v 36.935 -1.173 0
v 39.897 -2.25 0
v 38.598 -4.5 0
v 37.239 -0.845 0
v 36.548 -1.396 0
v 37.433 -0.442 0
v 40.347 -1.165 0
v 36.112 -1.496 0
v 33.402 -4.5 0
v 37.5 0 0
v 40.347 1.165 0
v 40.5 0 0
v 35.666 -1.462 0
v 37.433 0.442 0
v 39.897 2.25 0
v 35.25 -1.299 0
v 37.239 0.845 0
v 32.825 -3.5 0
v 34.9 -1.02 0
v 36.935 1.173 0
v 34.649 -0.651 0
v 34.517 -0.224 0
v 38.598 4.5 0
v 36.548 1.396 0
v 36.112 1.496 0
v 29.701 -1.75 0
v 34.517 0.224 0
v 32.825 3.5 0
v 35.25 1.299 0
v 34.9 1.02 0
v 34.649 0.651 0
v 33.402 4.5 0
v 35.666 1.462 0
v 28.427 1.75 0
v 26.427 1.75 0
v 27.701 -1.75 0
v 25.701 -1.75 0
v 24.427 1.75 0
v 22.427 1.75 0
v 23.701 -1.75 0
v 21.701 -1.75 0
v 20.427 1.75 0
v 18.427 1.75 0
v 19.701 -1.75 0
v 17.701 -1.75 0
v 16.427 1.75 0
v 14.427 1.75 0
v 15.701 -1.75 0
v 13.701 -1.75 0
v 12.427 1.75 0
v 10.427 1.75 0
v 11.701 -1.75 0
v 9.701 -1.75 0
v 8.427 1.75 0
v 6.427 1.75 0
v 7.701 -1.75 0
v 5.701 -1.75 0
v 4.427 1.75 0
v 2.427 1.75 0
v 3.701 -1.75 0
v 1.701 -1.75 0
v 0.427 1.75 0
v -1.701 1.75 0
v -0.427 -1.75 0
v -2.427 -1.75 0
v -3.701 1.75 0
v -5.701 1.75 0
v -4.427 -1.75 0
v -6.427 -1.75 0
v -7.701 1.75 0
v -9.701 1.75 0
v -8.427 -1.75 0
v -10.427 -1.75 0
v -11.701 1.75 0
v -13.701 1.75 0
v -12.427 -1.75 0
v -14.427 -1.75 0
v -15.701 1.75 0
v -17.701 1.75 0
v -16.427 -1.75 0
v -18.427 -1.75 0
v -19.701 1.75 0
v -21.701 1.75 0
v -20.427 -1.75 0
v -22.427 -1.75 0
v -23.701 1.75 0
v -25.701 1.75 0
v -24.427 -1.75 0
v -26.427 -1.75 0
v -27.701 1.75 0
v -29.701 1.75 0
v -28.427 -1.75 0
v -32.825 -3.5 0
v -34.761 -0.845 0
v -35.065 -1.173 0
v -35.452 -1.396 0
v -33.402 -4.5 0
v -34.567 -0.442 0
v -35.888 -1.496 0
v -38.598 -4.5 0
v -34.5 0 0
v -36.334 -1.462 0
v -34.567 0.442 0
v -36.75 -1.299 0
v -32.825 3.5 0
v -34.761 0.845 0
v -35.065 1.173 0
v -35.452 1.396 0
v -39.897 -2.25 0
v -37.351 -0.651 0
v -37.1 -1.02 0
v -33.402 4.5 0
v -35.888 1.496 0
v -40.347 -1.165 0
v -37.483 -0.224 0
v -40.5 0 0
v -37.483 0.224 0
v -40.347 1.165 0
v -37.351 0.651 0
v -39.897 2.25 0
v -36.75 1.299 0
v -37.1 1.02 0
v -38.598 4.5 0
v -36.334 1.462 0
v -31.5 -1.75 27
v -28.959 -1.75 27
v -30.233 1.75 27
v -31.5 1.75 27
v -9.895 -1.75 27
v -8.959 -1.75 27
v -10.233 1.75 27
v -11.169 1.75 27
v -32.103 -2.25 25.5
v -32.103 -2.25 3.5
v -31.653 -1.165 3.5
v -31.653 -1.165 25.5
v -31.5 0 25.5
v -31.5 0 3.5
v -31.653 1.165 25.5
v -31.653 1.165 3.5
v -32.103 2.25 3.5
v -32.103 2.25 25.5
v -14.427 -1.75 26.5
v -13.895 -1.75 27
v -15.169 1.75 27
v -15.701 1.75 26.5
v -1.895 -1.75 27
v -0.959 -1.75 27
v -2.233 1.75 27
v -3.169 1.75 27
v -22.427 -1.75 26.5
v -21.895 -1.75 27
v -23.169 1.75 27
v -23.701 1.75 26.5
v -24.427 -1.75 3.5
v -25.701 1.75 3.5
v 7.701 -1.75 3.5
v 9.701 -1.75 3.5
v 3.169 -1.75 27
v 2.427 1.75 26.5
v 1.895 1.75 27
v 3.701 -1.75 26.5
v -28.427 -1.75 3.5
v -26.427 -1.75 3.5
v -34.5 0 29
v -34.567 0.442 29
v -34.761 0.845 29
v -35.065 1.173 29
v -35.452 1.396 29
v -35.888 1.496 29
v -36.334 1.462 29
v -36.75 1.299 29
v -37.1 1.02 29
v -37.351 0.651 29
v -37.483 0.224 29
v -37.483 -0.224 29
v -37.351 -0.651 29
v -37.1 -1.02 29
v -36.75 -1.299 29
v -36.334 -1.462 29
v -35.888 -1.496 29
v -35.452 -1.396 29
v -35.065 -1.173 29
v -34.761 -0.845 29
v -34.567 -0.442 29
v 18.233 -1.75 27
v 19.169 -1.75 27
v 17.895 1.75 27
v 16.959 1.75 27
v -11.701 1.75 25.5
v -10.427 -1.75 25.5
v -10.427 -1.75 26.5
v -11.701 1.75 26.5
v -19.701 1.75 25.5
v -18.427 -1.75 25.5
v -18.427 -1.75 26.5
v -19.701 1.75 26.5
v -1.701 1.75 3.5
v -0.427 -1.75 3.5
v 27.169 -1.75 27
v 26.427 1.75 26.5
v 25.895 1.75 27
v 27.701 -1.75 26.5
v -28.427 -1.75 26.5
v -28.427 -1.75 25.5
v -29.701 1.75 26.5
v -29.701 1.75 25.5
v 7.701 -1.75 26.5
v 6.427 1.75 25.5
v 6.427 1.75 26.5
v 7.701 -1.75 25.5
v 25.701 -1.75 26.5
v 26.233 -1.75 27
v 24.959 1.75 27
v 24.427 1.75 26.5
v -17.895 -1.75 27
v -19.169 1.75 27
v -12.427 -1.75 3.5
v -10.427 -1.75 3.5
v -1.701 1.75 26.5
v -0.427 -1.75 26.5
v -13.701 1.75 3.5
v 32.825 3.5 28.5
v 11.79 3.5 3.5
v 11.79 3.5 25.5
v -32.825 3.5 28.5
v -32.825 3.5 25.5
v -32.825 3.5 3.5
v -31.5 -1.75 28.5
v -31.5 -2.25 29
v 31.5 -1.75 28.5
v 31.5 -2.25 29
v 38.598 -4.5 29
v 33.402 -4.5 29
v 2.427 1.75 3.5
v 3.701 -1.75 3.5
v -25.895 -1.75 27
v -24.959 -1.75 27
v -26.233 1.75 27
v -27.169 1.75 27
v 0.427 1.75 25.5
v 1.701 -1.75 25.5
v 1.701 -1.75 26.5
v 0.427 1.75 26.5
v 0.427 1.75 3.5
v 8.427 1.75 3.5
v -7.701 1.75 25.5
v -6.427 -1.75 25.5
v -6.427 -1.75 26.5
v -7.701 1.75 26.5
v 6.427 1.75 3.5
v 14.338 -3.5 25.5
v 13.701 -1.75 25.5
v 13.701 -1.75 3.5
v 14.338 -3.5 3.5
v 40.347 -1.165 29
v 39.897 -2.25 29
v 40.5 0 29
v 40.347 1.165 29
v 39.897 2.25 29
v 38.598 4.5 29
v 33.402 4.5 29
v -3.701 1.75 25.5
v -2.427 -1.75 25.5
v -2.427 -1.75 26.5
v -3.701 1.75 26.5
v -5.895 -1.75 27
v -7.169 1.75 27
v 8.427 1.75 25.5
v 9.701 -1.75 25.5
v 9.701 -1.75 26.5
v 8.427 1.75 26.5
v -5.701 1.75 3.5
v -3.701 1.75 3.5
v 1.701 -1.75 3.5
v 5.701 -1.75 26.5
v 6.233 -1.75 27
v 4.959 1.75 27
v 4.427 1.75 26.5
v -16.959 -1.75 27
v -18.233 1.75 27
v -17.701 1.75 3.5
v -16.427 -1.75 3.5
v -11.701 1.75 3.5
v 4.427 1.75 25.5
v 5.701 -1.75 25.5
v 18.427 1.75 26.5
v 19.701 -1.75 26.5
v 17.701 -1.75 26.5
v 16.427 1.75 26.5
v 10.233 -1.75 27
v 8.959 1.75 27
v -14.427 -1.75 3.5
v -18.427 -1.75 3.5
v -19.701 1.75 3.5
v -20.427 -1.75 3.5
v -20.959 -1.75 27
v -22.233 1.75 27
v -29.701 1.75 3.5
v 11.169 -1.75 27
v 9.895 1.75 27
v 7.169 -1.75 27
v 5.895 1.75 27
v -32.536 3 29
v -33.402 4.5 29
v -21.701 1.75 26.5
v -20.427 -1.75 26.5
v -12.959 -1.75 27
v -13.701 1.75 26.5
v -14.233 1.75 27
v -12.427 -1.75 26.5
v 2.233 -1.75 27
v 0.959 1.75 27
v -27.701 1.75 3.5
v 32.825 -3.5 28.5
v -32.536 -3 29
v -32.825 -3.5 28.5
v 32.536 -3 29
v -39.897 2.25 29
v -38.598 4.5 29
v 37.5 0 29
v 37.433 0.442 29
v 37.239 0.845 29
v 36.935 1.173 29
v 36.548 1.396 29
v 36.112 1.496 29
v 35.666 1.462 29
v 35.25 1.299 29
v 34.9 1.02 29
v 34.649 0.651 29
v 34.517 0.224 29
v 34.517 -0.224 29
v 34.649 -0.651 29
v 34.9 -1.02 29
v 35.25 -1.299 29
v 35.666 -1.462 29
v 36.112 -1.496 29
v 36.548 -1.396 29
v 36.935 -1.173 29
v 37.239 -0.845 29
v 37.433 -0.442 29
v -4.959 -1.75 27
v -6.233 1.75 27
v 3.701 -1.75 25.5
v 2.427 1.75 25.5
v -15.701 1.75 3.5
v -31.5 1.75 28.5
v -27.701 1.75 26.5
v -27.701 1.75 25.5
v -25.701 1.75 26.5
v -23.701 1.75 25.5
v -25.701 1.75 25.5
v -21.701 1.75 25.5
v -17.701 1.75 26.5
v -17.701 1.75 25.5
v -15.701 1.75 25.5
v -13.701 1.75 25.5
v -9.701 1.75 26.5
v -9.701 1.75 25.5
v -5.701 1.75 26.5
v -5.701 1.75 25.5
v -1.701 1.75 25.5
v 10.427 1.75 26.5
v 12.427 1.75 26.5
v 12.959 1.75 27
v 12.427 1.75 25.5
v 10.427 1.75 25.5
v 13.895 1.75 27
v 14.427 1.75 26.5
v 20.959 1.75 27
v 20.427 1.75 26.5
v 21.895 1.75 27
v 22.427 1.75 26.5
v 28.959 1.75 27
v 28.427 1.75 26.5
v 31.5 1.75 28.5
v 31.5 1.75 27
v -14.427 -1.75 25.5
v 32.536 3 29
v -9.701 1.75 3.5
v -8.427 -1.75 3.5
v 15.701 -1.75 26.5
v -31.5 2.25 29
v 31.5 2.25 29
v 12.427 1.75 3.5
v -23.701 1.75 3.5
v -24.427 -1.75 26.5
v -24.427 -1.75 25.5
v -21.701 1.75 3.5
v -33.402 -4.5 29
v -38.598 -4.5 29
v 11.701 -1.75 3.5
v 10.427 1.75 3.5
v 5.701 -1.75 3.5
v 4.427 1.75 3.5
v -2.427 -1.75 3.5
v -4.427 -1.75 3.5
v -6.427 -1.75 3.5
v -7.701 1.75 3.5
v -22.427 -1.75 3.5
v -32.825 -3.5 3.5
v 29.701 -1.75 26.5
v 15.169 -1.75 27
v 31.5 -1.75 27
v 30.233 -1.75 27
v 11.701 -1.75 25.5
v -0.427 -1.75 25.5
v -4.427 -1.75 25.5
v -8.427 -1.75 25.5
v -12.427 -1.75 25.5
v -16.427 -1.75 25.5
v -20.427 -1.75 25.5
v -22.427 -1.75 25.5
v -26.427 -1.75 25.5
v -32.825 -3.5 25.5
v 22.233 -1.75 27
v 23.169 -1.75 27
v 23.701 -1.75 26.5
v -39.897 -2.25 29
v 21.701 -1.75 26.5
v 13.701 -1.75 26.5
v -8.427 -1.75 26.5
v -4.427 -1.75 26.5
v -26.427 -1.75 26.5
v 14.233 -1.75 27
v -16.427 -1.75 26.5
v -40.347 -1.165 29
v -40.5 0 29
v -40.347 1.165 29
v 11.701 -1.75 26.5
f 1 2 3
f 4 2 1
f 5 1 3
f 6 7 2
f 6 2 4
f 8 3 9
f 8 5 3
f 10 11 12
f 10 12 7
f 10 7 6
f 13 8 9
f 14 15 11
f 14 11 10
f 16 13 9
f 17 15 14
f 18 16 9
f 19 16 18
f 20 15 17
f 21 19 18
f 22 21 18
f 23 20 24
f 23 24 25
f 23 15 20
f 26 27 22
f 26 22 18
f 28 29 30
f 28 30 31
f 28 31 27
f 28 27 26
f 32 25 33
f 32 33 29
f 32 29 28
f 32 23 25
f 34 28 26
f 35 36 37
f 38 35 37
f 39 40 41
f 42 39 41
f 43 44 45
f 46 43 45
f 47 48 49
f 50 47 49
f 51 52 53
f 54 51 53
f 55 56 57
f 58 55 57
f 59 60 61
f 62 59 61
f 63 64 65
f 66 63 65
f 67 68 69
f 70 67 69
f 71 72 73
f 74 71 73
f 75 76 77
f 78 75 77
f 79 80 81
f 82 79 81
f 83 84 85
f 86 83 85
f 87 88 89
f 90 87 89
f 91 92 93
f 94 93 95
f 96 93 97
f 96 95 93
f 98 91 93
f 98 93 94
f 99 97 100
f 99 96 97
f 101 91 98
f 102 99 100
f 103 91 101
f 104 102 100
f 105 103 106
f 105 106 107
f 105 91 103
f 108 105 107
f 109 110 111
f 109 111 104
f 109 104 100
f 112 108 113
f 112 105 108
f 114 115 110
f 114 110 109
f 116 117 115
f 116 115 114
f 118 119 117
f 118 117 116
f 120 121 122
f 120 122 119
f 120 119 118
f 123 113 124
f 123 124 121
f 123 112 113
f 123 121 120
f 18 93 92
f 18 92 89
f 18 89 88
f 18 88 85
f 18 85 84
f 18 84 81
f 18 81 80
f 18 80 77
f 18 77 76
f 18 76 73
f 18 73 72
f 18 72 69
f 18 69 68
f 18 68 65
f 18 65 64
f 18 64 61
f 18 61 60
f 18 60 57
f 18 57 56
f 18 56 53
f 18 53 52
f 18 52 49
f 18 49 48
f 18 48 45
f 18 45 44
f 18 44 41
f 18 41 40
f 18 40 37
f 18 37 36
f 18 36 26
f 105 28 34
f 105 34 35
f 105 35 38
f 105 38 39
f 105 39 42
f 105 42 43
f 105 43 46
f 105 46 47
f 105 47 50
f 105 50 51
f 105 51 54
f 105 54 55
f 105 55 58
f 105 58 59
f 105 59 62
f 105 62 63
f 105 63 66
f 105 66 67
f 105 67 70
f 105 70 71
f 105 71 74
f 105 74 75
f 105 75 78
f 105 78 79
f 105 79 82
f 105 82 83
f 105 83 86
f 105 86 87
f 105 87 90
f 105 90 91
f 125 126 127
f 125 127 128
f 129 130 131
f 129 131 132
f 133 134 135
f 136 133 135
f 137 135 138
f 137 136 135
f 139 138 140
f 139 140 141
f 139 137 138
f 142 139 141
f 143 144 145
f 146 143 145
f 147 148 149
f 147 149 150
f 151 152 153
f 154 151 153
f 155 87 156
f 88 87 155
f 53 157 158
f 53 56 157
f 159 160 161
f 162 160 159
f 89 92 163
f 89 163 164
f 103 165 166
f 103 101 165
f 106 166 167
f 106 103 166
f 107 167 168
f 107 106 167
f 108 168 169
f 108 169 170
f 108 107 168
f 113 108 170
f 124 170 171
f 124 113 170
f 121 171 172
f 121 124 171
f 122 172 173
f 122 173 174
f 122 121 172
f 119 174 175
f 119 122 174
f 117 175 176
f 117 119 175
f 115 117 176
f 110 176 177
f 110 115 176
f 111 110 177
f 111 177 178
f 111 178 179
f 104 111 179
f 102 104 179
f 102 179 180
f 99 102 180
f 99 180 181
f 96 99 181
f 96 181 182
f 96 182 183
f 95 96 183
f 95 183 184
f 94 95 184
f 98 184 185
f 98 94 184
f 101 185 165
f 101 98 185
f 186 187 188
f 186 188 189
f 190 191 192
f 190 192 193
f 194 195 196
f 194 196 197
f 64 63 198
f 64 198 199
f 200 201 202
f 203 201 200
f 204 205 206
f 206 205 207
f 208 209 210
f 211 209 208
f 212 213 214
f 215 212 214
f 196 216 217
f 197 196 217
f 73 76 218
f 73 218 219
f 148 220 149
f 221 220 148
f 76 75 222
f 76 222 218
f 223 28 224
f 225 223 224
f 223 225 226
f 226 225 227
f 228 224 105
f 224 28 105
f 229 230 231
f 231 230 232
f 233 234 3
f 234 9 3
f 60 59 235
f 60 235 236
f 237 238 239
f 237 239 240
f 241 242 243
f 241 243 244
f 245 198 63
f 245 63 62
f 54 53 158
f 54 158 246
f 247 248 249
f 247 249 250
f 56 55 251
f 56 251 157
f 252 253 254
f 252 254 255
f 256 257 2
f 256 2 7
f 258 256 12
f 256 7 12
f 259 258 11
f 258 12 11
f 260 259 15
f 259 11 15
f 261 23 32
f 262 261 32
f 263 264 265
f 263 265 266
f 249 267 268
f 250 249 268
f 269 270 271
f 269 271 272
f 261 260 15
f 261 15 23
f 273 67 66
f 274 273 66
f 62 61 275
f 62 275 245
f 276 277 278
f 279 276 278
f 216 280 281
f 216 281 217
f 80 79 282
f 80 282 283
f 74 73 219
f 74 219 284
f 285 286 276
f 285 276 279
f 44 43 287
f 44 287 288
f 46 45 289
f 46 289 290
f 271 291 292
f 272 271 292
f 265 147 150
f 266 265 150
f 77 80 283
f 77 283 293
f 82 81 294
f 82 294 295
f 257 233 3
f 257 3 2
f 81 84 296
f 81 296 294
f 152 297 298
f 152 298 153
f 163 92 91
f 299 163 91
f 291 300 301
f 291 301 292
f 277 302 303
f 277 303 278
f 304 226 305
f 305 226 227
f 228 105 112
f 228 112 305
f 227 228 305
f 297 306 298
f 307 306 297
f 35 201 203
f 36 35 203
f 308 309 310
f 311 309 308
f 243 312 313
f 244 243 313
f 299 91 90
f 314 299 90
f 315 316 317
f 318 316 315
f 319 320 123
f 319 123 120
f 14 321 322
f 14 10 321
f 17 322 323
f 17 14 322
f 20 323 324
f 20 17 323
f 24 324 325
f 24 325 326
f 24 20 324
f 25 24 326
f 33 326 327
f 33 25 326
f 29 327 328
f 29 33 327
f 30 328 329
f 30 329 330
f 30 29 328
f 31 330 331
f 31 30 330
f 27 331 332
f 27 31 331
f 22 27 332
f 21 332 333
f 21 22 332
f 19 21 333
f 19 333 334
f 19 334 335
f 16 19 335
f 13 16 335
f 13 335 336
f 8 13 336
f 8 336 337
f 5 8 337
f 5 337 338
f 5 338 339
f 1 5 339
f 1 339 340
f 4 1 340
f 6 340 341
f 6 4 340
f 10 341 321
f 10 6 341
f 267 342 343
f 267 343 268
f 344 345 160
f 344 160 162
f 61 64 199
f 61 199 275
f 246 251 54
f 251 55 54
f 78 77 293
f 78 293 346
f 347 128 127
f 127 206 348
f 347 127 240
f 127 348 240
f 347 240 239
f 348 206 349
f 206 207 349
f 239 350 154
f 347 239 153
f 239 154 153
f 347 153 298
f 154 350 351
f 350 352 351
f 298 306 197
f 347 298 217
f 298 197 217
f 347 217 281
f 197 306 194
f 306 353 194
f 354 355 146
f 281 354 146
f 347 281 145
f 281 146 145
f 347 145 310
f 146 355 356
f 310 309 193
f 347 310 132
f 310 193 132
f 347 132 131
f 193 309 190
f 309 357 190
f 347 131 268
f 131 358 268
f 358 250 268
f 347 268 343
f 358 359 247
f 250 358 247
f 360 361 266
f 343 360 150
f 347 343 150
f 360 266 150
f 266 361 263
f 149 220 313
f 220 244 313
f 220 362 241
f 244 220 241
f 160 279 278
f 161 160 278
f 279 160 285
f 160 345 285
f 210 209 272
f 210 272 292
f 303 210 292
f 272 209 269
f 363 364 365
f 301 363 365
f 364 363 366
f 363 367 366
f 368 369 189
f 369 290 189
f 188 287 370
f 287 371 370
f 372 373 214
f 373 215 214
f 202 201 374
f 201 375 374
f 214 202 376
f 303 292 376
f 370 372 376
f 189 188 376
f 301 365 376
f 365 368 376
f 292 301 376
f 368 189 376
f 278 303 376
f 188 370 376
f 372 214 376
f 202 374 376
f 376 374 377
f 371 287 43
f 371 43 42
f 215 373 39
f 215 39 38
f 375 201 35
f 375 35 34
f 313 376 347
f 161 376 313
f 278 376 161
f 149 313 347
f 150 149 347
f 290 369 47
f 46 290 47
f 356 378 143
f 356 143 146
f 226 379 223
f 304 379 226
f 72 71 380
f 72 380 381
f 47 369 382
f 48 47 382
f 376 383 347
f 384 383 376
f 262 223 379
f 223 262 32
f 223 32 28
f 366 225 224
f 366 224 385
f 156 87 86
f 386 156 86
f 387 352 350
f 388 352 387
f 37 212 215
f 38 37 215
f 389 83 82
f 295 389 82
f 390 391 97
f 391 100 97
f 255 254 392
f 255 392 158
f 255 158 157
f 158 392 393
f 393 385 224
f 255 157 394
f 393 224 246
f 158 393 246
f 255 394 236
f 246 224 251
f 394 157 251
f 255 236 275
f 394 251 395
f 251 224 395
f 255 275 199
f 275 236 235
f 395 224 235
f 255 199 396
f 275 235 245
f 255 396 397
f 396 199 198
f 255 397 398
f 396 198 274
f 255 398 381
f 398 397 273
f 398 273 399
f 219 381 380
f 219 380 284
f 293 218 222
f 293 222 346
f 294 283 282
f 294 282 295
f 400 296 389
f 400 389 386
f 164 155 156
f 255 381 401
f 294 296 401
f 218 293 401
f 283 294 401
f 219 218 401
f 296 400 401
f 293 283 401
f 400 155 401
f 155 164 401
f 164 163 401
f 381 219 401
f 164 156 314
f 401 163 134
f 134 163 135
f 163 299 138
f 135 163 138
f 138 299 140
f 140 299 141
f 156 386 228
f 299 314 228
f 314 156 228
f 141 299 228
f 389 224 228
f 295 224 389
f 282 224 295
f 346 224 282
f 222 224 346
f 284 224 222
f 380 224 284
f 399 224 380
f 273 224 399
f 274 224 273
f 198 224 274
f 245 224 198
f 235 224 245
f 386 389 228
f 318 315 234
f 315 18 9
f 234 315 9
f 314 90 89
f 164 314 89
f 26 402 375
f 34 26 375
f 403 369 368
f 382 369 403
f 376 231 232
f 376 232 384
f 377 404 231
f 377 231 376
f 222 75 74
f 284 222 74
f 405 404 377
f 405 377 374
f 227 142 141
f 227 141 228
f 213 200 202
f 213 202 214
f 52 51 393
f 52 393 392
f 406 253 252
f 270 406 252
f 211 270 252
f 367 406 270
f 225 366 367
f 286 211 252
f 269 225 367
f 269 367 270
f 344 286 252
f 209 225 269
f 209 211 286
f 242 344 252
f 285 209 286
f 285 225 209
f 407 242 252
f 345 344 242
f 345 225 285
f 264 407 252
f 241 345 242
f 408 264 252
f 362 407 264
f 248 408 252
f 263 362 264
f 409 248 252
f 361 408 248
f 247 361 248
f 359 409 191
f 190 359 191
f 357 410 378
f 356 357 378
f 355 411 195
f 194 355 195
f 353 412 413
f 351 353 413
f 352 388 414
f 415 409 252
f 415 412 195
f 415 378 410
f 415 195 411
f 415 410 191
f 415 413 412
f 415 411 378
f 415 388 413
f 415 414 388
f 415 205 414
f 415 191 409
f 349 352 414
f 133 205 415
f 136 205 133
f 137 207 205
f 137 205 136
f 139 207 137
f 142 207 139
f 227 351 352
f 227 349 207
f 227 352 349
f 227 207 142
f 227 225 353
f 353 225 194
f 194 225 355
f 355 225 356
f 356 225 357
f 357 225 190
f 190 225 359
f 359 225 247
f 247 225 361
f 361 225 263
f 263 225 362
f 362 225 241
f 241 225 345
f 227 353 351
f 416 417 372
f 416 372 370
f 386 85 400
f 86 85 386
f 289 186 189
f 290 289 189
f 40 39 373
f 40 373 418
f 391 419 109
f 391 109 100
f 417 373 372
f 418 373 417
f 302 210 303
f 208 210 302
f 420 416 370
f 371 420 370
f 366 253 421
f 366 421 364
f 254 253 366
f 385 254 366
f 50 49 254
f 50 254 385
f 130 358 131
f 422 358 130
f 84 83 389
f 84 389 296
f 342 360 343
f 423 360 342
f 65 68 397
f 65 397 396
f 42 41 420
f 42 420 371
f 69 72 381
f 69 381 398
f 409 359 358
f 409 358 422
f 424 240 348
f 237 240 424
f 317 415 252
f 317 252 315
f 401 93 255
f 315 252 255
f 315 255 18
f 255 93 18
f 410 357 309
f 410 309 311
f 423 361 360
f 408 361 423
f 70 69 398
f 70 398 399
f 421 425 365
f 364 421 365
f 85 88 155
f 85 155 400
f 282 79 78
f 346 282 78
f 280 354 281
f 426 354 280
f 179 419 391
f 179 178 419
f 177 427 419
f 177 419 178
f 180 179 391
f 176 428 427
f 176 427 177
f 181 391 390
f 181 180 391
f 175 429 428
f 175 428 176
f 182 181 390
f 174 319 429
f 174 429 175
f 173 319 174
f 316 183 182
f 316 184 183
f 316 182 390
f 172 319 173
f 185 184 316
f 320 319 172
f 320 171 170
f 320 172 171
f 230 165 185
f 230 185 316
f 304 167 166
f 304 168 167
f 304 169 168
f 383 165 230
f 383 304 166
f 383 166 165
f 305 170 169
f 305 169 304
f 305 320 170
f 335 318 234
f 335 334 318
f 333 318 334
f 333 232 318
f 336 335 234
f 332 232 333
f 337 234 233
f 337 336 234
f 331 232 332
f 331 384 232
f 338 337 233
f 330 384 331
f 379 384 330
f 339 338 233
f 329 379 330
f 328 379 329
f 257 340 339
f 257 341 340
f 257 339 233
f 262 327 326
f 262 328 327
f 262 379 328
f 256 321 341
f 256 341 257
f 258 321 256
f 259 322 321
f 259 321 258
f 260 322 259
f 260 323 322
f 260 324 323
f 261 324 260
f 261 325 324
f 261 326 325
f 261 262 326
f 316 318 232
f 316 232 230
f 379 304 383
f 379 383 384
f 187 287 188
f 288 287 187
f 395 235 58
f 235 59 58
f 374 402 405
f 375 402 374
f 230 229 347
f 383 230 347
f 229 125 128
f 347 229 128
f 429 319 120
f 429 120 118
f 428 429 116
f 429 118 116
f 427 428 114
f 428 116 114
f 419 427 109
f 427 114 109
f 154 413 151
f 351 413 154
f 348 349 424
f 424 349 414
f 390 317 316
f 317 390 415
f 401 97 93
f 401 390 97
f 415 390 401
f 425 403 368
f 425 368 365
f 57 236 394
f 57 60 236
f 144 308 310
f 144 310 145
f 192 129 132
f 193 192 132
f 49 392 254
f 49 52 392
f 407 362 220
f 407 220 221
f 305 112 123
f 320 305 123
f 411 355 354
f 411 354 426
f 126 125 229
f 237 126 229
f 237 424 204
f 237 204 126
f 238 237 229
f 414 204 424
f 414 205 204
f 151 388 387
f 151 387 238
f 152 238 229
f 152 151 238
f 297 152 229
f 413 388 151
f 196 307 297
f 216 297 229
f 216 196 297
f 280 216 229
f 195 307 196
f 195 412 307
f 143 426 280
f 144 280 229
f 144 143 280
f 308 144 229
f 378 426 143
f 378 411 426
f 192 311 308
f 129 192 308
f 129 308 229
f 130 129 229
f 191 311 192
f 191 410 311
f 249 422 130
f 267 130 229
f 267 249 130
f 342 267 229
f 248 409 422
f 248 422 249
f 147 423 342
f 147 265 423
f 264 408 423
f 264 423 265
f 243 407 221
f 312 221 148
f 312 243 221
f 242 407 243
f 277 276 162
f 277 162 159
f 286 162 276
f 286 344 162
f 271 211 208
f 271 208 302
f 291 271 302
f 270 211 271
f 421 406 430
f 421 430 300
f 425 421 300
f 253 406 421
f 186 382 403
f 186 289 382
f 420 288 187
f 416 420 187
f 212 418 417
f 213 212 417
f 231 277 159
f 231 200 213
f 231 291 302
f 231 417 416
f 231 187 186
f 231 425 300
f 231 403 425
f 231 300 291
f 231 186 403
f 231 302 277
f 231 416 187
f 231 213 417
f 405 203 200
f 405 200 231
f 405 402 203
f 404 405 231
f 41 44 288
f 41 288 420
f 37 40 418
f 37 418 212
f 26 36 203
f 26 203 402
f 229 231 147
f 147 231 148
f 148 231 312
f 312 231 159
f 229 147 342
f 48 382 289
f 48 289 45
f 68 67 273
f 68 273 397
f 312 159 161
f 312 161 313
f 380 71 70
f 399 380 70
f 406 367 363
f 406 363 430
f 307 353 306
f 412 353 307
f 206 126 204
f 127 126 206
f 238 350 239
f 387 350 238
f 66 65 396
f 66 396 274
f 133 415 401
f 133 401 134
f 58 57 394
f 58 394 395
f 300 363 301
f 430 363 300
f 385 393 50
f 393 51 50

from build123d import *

# Parameters (mm, degrees)
SKETCH2_R           = 1.5
BOSS_EXTRUDE1_DEPTH = 27
SKETCH3_R           = 1.5
SKETCH3_W           = 63
SKETCH3_H           = 3.5
BOSS_EXTRUDE2_DEPTH = 2
CHAMFER1_SIZE       = 0.5
CUT_EXTRUDE1_DEPTH  = 11


with BuildPart() as part:
    # Sketch2 → Boss-Extrude1 (new body)
    with BuildSketch(Plane.XY):
        with BuildLine():
            Line((32.824573519, -3.5), (-32.824573519, -3.5))
            Line((-32.824573519, -3.5), (-33.401923789, -4.5))
            Line((-33.401923789, -4.5), (-38.598076211, -4.5))
            Line((-38.598076211, -4.5), (-39.897114317, -2.25))
            ThreePointArc((-39.897114317, -2.25), (-40.5, 0), (-39.897114317, 2.25))
            Line((-39.897114317, 2.25), (-38.598076211, 4.5))
            Line((-38.598076211, 4.5), (-33.401923789, 4.5))
            Line((-33.401923789, 4.5), (-32.824573519, 3.5))
            Line((-32.824573519, 3.5), (32.824573519, 3.5))
            Line((32.824573519, 3.5), (33.401923789, 4.5))
            Line((33.401923789, 4.5), (38.598076211, 4.5))
            Line((38.598076211, 4.5), (39.897114317, 2.25))
            ThreePointArc((39.897114317, 2.25), (40.5, 0), (39.897114317, -2.25))
            Line((39.897114317, -2.25), (38.598076211, -4.5))
            Line((38.598076211, -4.5), (33.401923789, -4.5))
            Line((33.401923789, -4.5), (32.824573519, -3.5))
        make_face()
        with Locations((-36, 0)):
            Circle(SKETCH2_R, mode=Mode.SUBTRACT)
        with Locations((36, 0)):
            Circle(SKETCH2_R, mode=Mode.SUBTRACT)
        Polygon((-27.701125682, 1.75), (-26.427229863, -1.75), (-28.427229863, -1.75), (-29.701125682, 1.75), align=None, mode=Mode.SUBTRACT)
        Polygon((-25.701125682, 1.75), (-24.427229863, -1.75), (-22.427229863, -1.75), (-23.701125682, 1.75), align=None, mode=Mode.SUBTRACT)
        Polygon((-21.701125682, 1.75), (-20.427229863, -1.75), (-18.427229863, -1.75), (-19.701125682, 1.75), align=None, mode=Mode.SUBTRACT)
        Polygon((-17.701125682, 1.75), (-16.427229863, -1.75), (-14.427229863, -1.75), (-15.701125682, 1.75), align=None, mode=Mode.SUBTRACT)
        Polygon((-13.701125682, 1.75), (-12.427229863, -1.75), (-10.427229863, -1.75), (-11.701125682, 1.75), align=None, mode=Mode.SUBTRACT)
        Polygon((-9.701125682, 1.75), (-8.427229863, -1.75), (-6.427229863, -1.75), (-7.701125682, 1.75), align=None, mode=Mode.SUBTRACT)
        Polygon((-5.701125682, 1.75), (-4.427229863, -1.75), (-2.427229863, -1.75), (-3.701125682, 1.75), align=None, mode=Mode.SUBTRACT)
        Polygon((-1.701125682, 1.75), (-0.427229863, -1.75), (1.701125682, -1.75), (0.427229863, 1.75), align=None, mode=Mode.SUBTRACT)
        Polygon((2.427229863, 1.75), (3.701125682, -1.75), (5.701125682, -1.75), (4.427229863, 1.75), align=None, mode=Mode.SUBTRACT)
        Polygon((6.427229863, 1.75), (7.701125682, -1.75), (9.701125682, -1.75), (8.427229863, 1.75), align=None, mode=Mode.SUBTRACT)
        Polygon((10.427229863, 1.75), (11.701125682, -1.75), (13.701125682, -1.75), (12.427229863, 1.75), align=None, mode=Mode.SUBTRACT)
        Polygon((14.427229863, 1.75), (15.701125682, -1.75), (17.701125682, -1.75), (16.427229863, 1.75), align=None, mode=Mode.SUBTRACT)
        Polygon((18.427229863, 1.75), (19.701125682, -1.75), (21.701125682, -1.75), (20.427229863, 1.75), align=None, mode=Mode.SUBTRACT)
        Polygon((22.427229863, 1.75), (23.701125682, -1.75), (25.701125682, -1.75), (24.427229863, 1.75), align=None, mode=Mode.SUBTRACT)
        Polygon((26.427229863, 1.75), (27.701125682, -1.75), (29.701125682, -1.75), (28.427229863, 1.75), align=None, mode=Mode.SUBTRACT)
    extrude(amount=BOSS_EXTRUDE1_DEPTH)

    # Sketch3 → Boss-Extrude2 (add)
    with BuildSketch(Plane.XY.offset(27)):
        with BuildLine():
            Line((-39.897114317, -2.25), (-38.598076211, -4.5))
            Line((-38.598076211, -4.5), (-33.401923789, -4.5))
            Line((-33.401923789, -4.5), (-32.824573519, -3.5))
            Line((-32.824573519, -3.5), (32.824573519, -3.5))
            Line((32.824573519, -3.5), (33.401923789, -4.5))
            Line((33.401923789, -4.5), (38.598076211, -4.5))
            Line((38.598076211, -4.5), (39.897114317, -2.25))
            ThreePointArc((39.897114317, -2.25), (40.5, 0), (39.897114317, 2.25))
            Line((39.897114317, 2.25), (38.598076211, 4.5))
            Line((38.598076211, 4.5), (33.401923789, 4.5))
            Line((33.401923789, 4.5), (32.824573519, 3.5))
            Line((32.824573519, 3.5), (-32.824573519, 3.5))
            Line((-32.824573519, 3.5), (-33.401923789, 4.5))
            Line((-33.401923789, 4.5), (-38.598076211, 4.5))
            Line((-38.598076211, 4.5), (-39.897114317, 2.25))
            ThreePointArc((-39.897114317, 2.25), (-40.5, 0), (-39.897114317, -2.25))
        make_face()
        with Locations((-36, 0)):
            Circle(SKETCH3_R, mode=Mode.SUBTRACT)
        with Locations((36, 0)):
            Circle(SKETCH3_R, mode=Mode.SUBTRACT)
        Rectangle(SKETCH3_W, SKETCH3_H, mode=Mode.SUBTRACT)
    extrude(amount=BOSS_EXTRUDE2_DEPTH)

    # Chamfer1
    chamfer1_edges = [part.edges().sort_by_distance(p)[0] for p in [
        (-9.064177772, 0, 27),
        (-7.064177772, 0, 27),
        (-5.064177772, 0, 27),
        (-3.064177772, 0, 27),
        (-1.064177772, 0, 27),
        (1.064177772, 0, 27),
        (3.064177772, 0, 27),
        (5.064177772, 0, 27),
        (7.064177772, 0, 27),
        (9.064177772, 0, 27),
        (11.064177772, 0, 27),
        (13.064177772, 0, 27),
        (15.064177772, 0, 27),
        (17.064177772, 0, 27),
        (19.064177772, 0, 27),
        (21.064177772, 0, 27),
        (23.064177772, 0, 27),
        (25.064177772, 0, 27),
        (27.064177772, 0, 27),
        (29.064177772, 0, 27),
        (0, -3.5, 29),
        (0, 3.5, 29),
        (0, 1.75, 29),
        (0, -1.75, 29),
        (-29.064177772, 0, 27),
        (-27.064177772, 0, 27),
        (-25.064177772, 0, 27),
        (-23.064177772, 0, 27),
        (-21.064177772, 0, 27),
        (-19.064177772, 0, 27),
        (-17.064177772, 0, 27),
        (-15.064177772, 0, 27),
        (-13.064177772, 0, 27),
        (-11.064177772, 0, 27),
    ]]
    chamfer(chamfer1_edges, length=CHAMFER1_SIZE)

    # Sketch4 → Cut-Extrude1 (cut, symmetric)
    with BuildSketch(Plane.XY.offset(14.5)):
        with BuildLine():
            Line((-33.401923789, 4.5), (-34.844518305, 6.998646998))
            Line((-34.844518305, 6.998646998), (10.516878585, 6.998646998))
            Line((10.516878585, 6.998646998), (12.427229863, 1.75))
            Line((12.427229863, 1.75), (13.701125682, -1.75))
            Line((13.701125682, -1.75), (15.61147696, -6.998646998))
            Line((15.61147696, -6.998646998), (-34.844518305, -6.998646998))
            Line((-34.844518305, -6.998646998), (-33.401923789, -4.5))
            Line((-33.401923789, -4.5), (-32.102885683, -2.25))
            ThreePointArc((-32.102885683, -2.25), (-31.5, 0), (-32.102885683, 2.25))
            Line((-32.102885683, 2.25), (-33.401923789, 4.5))
        make_face()
    extrude(amount=CUT_EXTRUDE1_DEPTH, both=True, mode=Mode.SUBTRACT)


solid = part.part
